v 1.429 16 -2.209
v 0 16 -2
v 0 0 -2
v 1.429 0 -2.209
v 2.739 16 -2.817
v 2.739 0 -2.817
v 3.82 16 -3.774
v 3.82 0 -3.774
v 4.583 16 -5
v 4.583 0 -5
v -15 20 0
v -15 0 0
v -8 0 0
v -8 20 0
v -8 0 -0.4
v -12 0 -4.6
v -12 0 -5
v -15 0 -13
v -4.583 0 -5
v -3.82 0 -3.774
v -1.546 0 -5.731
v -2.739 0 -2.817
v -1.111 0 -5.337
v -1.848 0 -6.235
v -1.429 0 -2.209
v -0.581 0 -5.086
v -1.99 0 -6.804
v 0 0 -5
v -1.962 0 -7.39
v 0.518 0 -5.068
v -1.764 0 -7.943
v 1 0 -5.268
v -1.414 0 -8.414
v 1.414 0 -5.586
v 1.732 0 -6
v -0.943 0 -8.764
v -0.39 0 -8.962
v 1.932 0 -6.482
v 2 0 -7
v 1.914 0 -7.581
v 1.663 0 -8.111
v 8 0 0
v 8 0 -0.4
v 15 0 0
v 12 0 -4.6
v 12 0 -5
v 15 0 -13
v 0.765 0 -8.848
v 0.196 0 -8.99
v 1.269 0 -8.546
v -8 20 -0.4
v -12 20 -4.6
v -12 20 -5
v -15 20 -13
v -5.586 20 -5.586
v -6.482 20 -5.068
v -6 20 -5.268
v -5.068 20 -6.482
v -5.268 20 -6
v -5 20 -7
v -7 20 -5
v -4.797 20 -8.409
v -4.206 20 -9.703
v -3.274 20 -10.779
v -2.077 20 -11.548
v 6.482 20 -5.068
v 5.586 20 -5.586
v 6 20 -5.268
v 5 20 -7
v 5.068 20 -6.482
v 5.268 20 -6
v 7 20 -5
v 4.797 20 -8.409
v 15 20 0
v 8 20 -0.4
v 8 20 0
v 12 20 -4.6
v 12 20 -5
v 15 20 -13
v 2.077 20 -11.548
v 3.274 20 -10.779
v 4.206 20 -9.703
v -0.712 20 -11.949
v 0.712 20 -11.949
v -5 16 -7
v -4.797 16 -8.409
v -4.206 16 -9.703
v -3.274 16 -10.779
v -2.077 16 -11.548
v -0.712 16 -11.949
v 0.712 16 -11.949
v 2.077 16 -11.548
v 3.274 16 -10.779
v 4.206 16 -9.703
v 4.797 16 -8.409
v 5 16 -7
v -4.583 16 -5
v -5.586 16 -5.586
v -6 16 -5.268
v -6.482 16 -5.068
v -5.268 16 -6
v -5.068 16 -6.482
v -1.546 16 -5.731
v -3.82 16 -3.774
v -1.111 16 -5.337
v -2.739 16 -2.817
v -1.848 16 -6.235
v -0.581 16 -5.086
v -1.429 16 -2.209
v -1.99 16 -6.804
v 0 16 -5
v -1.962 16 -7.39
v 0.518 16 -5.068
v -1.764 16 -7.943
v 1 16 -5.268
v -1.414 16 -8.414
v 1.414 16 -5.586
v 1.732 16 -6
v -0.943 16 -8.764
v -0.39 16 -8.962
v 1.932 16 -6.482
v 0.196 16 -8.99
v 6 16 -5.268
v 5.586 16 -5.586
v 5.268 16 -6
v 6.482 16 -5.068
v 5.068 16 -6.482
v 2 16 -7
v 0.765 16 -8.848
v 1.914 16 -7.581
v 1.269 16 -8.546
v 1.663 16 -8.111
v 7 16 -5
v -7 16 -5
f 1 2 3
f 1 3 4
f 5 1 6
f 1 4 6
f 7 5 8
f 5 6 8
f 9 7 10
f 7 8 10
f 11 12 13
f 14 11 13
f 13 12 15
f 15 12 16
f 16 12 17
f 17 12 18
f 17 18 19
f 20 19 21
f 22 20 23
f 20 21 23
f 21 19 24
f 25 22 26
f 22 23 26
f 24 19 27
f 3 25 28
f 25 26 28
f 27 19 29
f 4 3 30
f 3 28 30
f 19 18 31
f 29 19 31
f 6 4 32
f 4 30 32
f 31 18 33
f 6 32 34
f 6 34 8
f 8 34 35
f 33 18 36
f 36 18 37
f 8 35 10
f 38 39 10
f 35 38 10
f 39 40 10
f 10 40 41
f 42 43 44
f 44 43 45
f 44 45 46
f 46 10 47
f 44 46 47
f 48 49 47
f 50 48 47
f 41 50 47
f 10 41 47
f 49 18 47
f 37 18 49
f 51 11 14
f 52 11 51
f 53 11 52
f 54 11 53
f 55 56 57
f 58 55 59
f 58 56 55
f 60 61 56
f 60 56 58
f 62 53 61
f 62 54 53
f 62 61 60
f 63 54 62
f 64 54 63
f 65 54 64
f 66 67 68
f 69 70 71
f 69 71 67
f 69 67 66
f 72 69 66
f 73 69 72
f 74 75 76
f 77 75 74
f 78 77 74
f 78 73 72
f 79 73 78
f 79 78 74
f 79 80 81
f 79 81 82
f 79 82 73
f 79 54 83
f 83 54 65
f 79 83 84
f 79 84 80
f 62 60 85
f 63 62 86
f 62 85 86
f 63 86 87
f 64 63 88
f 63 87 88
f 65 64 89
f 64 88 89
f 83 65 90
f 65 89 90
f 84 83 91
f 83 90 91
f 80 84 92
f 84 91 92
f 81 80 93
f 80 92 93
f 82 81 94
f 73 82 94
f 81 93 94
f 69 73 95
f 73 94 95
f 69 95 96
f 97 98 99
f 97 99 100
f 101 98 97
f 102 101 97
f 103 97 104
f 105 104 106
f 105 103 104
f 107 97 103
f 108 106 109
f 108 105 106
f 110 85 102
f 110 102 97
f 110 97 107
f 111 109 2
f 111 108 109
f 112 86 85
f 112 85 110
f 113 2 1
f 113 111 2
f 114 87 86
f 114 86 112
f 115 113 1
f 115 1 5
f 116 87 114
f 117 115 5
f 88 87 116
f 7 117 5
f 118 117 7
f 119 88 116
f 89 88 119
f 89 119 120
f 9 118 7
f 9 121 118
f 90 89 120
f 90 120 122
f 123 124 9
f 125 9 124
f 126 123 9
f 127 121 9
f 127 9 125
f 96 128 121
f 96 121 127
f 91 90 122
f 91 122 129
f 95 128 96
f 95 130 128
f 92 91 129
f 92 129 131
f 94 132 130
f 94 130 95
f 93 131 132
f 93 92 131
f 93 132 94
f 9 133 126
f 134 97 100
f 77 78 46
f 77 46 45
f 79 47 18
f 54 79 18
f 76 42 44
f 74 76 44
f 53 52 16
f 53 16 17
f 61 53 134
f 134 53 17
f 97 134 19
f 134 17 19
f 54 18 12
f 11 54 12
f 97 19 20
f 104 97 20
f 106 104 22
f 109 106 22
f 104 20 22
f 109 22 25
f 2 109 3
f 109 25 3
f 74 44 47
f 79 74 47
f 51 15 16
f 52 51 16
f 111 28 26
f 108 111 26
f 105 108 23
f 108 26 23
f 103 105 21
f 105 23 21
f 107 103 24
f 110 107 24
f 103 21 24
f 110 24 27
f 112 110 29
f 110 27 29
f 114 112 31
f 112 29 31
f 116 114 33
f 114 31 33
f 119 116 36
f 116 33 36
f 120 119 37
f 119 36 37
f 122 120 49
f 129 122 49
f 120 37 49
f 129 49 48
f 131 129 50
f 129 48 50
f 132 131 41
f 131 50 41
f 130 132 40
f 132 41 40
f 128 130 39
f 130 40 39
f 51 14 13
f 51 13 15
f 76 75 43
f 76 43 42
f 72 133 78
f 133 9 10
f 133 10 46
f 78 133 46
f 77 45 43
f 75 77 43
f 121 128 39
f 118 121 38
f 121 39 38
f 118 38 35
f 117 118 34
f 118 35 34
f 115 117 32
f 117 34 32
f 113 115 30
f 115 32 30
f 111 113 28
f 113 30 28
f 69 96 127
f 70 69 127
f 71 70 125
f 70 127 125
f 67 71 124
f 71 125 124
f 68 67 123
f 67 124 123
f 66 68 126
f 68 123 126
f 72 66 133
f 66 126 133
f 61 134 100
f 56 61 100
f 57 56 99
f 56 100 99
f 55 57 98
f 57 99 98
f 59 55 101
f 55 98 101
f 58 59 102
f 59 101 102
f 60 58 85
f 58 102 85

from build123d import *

# Parameters (mm, degrees)
BOSS_EXTRUDE1_DEPTH = 20
SKETCH1_3_R         = 2
BOSS_EXTRUDE2_DEPTH = 16


with BuildPart() as part:
    # Sketch1 → Boss-Extrude1 (new body)
    with BuildSketch(Plane(origin=(0, 0, 0), x_dir=(1, 0, 0), z_dir=(0, 1, 0))):
        with BuildLine():
            Line((-15, 0), (-8, 0))
            Line((-8, 0), (-8, 0.4))
            Line((-8, 0.4), (-12, 4.6))
            Line((-12, 4.6), (-12, 5))
            Line((-12, 5), (-7, 5))
            ThreePointArc((-7, 5), (-5.585786438, 5.585786438), (-5, 7))
            ThreePointArc((-5, 7), (0, 12), (5, 7))
            ThreePointArc((5, 7), (5.585786438, 5.585786438), (7, 5))
            Line((7, 5), (12, 5))
            Line((12, 5), (12, 4.6))
            Line((12, 4.6), (8, 0.4))
            Line((8, 0.4), (8, 0))
            Line((8, 0), (15, 0))
            Line((15, 0), (15, 13))
            Line((15, 13), (-15, 13))
            Line((-15, 13), (-15, 0))
        make_face()
    extrude(amount=BOSS_EXTRUDE1_DEPTH)

    # Sketch1<3> → Boss-Extrude2 (add)
    with BuildSketch(Plane(origin=(0, 0, 0), x_dir=(1, 0, 0), z_dir=(0, 1, 0))):
        with BuildLine():
            ThreePointArc((-4.582575695, 5), (0, 2), (4.582575695, 5))
            Line((4.582575695, 5), (7, 5))
            ThreePointArc((7, 5), (5.585786438, 5.585786438), (5, 7))
            ThreePointArc((5, 7), (0, 12), (-5, 7))
            ThreePointArc((-5, 7), (-5.585786438, 5.585786438), (-7, 5))
            Line((-7, 5), (-4.582575695, 5))
        make_face()
        with Locations((0, 7)):
            Circle(SKETCH1_3_R, mode=Mode.SUBTRACT)
    extrude(amount=BOSS_EXTRUDE2_DEPTH)


solid = part.part
